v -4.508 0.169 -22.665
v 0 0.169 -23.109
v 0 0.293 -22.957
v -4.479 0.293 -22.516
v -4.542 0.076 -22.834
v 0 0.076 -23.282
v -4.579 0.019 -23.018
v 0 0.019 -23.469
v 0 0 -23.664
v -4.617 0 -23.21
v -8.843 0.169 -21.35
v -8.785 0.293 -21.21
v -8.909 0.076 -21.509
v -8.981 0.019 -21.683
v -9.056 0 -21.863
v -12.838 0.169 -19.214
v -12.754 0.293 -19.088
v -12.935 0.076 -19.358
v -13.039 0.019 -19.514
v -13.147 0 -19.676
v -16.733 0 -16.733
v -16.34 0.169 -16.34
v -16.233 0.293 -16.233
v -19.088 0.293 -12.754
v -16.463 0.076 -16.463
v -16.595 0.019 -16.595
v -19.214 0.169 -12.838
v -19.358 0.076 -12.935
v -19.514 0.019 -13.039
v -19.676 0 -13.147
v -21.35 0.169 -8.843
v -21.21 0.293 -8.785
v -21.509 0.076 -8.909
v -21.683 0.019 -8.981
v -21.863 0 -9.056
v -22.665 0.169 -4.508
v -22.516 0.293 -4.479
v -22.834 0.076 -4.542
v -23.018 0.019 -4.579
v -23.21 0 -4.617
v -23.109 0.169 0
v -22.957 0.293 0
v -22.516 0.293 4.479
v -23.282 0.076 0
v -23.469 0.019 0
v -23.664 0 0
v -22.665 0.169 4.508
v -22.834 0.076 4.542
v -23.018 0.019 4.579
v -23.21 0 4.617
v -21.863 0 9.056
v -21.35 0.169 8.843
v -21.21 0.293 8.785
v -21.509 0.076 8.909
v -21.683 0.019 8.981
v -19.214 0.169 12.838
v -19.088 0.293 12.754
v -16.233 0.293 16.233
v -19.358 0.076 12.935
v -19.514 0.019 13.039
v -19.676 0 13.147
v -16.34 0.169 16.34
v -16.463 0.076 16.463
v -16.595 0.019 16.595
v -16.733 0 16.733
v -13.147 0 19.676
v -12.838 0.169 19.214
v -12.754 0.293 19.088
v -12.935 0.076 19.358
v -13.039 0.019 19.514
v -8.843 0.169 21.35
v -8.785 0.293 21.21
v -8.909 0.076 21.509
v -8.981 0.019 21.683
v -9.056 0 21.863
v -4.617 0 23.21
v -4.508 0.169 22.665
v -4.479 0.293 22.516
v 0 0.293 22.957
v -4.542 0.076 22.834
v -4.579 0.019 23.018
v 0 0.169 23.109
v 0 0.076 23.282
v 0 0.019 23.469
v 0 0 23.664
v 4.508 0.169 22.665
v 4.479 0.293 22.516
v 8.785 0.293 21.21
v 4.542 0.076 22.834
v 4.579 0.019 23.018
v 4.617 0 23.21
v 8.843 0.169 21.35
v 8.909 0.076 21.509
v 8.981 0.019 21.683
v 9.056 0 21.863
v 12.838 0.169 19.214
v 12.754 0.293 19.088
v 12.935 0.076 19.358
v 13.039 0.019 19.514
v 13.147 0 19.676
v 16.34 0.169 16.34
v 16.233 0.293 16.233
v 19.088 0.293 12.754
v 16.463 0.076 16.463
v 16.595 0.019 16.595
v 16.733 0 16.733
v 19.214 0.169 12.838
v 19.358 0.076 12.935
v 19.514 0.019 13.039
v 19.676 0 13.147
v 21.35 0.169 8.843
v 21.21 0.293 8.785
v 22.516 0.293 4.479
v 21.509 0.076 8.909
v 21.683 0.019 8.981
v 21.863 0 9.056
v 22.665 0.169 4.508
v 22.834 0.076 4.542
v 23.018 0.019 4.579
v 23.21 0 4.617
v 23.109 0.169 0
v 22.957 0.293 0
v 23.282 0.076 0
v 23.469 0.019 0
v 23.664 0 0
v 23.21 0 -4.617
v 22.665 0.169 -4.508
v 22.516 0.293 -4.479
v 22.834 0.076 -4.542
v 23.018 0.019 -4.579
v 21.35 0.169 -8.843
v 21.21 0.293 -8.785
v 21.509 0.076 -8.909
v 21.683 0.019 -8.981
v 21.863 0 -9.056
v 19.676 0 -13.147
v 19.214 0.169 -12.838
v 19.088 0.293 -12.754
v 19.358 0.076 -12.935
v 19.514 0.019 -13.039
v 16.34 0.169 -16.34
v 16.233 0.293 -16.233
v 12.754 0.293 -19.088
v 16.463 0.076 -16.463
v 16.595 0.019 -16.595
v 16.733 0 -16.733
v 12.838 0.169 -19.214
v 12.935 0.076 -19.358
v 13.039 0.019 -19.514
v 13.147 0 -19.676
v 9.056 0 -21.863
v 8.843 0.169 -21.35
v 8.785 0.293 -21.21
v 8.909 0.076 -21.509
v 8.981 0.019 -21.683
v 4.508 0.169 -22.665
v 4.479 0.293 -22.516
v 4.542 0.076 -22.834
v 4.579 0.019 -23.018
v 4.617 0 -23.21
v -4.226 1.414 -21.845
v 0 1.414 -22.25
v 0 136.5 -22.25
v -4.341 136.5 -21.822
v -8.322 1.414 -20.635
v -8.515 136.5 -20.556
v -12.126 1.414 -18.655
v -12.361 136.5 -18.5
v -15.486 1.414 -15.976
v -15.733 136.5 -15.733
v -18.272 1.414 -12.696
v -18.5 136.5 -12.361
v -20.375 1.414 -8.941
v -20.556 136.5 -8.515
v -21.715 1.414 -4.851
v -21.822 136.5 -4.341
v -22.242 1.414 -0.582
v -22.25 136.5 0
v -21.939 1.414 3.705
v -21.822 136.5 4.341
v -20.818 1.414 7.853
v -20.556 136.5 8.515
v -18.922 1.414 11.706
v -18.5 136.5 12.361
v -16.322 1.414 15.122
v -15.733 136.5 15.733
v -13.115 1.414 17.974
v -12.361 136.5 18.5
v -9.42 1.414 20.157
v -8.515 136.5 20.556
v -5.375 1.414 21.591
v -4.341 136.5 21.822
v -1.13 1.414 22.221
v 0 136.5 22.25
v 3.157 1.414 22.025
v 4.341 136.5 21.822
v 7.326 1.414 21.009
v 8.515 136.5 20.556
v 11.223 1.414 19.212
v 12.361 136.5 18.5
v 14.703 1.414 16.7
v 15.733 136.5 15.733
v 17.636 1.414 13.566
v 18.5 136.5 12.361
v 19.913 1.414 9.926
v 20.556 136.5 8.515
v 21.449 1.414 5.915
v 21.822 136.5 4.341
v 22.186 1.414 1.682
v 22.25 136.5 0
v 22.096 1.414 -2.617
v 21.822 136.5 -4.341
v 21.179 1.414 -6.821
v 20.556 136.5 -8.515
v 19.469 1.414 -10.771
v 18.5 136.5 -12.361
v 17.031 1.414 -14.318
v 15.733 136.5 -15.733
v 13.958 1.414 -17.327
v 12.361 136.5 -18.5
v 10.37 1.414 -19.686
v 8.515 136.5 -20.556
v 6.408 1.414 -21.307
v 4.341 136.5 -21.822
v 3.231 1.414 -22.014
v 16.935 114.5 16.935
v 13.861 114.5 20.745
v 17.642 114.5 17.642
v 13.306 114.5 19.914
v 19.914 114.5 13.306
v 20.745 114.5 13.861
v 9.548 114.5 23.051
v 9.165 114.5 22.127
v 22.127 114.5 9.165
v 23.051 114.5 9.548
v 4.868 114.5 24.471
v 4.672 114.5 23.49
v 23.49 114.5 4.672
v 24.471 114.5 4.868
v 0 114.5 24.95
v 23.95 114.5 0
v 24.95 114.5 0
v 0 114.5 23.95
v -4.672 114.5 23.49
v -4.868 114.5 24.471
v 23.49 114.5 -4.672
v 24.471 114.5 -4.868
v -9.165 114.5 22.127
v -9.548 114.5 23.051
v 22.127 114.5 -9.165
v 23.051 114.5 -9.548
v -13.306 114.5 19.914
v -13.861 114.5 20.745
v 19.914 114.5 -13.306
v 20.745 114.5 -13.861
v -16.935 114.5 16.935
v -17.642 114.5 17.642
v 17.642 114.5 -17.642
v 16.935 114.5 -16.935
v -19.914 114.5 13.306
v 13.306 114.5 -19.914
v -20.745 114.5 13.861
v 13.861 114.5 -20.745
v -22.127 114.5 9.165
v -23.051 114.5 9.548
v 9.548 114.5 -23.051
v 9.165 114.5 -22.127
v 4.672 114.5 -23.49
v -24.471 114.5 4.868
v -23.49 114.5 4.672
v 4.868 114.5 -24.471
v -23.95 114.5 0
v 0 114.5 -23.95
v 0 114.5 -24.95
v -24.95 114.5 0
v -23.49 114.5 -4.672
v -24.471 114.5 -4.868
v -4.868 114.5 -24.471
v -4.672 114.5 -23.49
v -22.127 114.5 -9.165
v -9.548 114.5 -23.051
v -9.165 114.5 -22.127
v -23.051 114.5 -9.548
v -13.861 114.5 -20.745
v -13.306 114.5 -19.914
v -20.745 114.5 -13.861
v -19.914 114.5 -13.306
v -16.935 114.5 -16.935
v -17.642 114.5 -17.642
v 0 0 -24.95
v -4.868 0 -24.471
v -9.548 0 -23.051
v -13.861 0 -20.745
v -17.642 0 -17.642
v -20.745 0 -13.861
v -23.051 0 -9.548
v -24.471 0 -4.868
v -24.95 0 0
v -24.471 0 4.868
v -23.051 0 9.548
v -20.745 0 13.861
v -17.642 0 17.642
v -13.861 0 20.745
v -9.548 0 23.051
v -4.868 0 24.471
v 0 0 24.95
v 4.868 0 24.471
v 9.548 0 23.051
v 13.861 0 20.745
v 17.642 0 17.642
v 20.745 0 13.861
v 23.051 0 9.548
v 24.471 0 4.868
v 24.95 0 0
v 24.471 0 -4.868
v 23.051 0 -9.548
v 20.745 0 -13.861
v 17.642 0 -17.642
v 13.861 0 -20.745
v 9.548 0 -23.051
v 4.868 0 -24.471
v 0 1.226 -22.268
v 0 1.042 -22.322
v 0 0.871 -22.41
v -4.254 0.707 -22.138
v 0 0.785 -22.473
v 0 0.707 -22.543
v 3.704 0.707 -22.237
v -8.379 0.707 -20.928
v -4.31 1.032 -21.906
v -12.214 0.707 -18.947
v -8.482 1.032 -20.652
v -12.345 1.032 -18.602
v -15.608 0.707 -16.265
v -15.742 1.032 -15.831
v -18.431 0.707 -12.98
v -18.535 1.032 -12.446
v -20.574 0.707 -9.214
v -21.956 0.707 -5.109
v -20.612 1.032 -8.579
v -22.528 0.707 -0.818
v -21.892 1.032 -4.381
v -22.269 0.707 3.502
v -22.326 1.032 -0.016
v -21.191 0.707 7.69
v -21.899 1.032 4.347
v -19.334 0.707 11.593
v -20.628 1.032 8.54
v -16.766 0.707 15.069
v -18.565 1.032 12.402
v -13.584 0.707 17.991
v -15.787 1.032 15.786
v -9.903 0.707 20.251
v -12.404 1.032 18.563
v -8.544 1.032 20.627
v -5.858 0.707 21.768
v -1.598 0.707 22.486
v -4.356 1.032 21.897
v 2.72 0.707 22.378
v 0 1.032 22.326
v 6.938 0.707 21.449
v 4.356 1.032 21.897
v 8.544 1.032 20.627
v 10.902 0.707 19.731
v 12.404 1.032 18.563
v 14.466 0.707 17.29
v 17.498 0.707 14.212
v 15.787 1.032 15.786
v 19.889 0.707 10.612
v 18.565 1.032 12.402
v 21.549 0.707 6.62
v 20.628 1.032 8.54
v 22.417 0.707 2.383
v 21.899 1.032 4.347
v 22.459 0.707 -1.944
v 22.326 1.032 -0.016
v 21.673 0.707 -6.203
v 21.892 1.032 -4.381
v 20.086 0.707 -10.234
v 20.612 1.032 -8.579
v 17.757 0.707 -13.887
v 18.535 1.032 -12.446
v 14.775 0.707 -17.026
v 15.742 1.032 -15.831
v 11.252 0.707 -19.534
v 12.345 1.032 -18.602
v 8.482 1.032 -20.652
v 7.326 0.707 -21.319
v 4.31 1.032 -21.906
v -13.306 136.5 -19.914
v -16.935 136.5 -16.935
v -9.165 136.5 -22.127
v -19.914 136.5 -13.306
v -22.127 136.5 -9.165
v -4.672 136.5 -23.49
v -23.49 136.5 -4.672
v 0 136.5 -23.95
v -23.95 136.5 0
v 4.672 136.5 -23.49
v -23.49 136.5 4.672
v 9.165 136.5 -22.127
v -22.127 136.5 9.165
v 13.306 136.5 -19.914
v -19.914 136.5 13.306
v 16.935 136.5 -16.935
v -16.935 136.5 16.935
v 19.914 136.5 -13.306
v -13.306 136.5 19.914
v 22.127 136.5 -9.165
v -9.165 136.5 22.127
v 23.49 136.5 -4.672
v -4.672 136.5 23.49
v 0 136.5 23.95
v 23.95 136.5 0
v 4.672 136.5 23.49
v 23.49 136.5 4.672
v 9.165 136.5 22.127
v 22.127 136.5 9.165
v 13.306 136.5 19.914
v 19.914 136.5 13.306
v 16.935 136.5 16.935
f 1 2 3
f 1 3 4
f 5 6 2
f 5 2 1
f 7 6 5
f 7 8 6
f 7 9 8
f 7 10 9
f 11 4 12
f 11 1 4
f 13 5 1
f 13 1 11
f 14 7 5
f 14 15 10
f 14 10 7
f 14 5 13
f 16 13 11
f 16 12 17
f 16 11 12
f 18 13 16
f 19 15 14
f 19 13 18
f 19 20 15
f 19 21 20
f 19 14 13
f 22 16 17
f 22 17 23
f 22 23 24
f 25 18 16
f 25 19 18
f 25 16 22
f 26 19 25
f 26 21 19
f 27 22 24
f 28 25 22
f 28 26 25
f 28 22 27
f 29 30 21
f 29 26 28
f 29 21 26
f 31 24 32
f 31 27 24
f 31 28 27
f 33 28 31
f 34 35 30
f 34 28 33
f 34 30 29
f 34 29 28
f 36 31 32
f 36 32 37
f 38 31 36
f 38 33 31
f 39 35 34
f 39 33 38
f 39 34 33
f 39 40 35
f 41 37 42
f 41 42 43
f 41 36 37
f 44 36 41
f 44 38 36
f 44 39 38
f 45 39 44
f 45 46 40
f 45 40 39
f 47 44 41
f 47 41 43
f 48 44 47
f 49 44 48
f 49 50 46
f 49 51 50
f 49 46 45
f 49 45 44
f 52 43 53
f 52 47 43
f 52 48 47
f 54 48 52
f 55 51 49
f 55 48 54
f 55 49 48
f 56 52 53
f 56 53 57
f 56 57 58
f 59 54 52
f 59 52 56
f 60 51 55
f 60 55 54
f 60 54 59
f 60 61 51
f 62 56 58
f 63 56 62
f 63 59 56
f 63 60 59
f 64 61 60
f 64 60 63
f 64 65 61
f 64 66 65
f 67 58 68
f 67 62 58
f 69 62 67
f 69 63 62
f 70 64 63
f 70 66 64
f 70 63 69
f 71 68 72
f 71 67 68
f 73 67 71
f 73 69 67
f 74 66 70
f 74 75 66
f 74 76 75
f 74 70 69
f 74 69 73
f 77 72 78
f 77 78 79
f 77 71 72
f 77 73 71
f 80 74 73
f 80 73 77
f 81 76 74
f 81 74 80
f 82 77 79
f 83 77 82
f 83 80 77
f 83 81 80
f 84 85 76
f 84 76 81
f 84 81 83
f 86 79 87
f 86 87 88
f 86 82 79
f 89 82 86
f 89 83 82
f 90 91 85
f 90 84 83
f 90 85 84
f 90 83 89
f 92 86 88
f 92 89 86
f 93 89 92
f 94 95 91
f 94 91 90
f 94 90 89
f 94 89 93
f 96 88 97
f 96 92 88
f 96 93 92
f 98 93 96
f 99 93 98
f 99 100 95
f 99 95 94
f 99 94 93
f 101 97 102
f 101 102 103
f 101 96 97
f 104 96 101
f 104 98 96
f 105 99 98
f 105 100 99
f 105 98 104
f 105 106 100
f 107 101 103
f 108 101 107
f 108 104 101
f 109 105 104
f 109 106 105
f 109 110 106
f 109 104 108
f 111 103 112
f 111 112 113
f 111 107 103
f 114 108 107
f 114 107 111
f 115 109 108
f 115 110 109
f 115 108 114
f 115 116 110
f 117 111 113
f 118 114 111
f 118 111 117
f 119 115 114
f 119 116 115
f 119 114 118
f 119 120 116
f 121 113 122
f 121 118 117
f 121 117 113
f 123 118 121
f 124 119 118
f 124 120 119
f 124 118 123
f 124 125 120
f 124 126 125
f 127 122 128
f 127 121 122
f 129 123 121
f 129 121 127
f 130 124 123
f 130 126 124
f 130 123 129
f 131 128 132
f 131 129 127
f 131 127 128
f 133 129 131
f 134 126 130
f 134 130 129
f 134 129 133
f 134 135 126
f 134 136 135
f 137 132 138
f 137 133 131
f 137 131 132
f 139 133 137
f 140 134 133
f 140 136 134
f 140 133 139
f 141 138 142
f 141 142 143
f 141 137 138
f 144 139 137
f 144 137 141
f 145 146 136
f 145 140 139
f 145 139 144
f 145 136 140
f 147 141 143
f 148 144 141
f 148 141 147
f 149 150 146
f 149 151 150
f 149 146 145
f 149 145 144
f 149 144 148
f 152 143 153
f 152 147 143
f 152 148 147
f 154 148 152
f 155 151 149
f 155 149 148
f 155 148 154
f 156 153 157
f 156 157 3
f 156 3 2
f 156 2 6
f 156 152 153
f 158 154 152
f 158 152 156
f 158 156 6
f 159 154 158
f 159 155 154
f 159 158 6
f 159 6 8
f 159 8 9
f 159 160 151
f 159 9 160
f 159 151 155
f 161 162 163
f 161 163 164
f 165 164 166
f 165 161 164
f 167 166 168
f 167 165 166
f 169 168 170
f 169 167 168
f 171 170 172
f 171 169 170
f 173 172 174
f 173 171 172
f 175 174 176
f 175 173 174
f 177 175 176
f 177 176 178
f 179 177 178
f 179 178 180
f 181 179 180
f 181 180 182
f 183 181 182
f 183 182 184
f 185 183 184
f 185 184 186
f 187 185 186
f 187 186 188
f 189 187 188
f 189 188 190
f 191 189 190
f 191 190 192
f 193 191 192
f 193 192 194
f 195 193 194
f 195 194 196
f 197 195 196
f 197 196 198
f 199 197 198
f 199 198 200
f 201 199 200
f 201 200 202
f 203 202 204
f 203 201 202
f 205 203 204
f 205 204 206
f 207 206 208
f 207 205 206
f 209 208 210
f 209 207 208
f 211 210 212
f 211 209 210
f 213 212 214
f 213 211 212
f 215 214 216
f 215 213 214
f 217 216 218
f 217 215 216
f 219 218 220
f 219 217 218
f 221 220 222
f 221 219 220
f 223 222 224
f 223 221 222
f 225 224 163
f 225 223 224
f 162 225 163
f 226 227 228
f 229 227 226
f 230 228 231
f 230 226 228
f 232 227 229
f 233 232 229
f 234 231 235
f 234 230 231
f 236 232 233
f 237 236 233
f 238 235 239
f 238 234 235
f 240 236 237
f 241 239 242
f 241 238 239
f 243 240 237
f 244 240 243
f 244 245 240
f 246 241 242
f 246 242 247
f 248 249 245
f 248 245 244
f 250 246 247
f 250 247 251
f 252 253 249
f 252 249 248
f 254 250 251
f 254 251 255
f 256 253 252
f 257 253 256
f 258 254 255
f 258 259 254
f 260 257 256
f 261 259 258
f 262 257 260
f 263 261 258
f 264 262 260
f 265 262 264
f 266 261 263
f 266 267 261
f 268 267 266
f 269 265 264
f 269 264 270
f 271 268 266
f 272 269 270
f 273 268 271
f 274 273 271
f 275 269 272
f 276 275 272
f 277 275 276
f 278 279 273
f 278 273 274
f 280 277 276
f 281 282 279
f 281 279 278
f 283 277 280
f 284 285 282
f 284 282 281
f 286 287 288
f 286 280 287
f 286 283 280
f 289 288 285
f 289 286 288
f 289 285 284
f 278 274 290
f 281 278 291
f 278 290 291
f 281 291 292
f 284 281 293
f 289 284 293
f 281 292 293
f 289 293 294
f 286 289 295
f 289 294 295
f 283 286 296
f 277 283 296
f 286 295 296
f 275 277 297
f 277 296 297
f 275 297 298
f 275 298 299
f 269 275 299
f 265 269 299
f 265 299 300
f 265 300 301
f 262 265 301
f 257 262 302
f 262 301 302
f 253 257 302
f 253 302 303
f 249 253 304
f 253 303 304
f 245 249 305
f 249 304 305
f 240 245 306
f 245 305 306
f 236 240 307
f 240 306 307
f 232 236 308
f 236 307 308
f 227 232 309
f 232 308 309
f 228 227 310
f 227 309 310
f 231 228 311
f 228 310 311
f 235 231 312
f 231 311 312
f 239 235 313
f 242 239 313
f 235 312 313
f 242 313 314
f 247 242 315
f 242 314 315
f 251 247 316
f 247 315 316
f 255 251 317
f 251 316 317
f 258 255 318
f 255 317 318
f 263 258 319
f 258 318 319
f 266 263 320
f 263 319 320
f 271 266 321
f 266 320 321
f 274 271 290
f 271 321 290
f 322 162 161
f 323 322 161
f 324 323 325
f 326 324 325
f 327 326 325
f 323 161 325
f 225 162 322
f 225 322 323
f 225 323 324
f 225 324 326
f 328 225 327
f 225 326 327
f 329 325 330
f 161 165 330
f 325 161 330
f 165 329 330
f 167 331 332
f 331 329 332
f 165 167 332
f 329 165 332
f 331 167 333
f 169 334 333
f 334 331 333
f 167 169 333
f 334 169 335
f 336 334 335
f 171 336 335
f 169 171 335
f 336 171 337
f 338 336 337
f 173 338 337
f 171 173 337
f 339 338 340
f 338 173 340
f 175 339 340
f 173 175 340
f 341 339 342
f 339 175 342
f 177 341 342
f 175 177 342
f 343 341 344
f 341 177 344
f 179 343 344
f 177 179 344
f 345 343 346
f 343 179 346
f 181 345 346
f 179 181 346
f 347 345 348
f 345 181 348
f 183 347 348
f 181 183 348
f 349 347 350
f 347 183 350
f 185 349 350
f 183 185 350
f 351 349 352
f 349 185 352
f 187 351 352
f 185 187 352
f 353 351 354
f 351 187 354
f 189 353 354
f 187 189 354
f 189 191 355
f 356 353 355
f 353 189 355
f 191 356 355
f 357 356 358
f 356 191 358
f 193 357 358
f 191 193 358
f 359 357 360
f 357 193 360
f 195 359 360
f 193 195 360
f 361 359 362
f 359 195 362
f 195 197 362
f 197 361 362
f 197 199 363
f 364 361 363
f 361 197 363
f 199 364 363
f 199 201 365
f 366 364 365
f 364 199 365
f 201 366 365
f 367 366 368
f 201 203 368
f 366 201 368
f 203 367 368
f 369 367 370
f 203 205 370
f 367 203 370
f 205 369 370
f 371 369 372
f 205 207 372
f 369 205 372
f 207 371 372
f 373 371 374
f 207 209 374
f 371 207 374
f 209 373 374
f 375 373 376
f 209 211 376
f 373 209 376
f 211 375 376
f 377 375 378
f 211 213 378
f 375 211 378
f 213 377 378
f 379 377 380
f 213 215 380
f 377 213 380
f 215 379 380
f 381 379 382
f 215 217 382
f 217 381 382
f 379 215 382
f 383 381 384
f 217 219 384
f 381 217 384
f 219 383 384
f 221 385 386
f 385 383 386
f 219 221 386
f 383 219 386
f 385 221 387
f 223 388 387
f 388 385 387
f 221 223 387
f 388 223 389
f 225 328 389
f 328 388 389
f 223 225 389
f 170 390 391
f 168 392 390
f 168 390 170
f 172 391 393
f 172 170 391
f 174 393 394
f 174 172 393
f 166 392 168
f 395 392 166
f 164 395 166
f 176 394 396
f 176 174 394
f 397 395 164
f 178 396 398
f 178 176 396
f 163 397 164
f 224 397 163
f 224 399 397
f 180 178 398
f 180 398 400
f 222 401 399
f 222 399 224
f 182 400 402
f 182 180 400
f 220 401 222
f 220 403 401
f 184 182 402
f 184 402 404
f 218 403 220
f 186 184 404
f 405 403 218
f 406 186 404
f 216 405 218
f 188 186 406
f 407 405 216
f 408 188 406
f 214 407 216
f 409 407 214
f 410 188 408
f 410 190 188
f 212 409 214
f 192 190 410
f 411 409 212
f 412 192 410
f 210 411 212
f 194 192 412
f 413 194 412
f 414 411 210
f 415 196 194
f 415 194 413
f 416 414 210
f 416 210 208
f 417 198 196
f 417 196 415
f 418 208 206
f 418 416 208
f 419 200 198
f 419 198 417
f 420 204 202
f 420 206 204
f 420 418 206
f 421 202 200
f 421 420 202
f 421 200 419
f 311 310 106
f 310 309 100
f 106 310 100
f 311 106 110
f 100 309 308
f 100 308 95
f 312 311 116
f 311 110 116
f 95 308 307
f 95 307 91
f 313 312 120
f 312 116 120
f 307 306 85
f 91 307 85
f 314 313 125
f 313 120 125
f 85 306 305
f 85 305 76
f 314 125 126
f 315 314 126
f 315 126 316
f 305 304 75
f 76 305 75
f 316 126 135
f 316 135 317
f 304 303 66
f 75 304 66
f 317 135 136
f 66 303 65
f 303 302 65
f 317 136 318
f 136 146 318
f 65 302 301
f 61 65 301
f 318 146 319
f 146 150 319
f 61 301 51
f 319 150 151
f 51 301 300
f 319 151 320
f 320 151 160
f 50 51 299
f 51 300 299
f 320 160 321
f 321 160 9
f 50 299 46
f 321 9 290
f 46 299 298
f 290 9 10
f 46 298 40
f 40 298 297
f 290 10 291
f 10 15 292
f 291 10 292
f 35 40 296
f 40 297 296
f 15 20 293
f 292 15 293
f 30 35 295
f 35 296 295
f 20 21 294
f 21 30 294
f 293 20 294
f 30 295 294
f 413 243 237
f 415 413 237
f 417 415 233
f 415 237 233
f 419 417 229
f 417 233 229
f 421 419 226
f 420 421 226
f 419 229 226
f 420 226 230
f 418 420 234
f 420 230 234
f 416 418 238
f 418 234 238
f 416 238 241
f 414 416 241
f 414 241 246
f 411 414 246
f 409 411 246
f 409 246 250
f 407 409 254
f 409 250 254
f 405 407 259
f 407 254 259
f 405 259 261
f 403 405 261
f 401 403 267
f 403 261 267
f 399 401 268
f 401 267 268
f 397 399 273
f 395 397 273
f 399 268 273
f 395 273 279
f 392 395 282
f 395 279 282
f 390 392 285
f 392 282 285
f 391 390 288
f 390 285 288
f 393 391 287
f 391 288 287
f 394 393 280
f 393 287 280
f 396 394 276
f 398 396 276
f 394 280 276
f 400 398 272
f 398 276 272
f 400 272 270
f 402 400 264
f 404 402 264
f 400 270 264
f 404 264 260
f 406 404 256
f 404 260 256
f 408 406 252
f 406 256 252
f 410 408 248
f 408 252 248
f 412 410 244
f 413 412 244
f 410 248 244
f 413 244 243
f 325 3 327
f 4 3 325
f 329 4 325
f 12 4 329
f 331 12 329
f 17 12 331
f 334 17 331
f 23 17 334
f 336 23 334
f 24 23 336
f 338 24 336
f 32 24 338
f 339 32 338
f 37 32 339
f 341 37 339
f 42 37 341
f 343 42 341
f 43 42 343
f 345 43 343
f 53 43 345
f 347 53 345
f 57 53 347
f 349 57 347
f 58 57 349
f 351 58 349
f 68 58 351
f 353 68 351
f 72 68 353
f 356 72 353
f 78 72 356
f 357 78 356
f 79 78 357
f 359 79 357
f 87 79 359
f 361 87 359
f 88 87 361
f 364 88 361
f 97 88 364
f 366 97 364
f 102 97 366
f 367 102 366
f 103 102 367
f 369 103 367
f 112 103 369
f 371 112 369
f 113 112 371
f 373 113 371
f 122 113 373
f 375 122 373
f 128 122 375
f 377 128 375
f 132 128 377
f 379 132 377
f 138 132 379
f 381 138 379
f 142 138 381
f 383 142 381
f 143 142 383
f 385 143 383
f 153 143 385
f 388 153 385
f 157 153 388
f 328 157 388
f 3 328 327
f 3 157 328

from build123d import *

# Parameters (mm, degrees)
SKETCH_1_R      = 24.95
SKETCH_1_R_2    = 22.25
EXTRUDE_1_DEPTH = 114.5
SKETCH_2_R      = 23.95
SKETCH_2_R_2    = 22.25
EXTRUDE_2_DEPTH = 22
CHAMFER_1_SIZE  = 1
FILLET_1_R      = 1


with BuildPart() as part:
    # 草图1 → 凸台-拉伸1 (new body)
    with BuildSketch(Plane(origin=(0, 0, 0), x_dir=(1, 0, 0), z_dir=(0, 1, 0))):
        with Locations(Location((0, 0, 0), (0, 0, 90))):
            Circle(SKETCH_1_R)
        with Locations(Location((0, 0, 0), (0, 0, 90))):
            Circle(SKETCH_1_R_2, mode=Mode.SUBTRACT)
    extrude(amount=EXTRUDE_1_DEPTH)

    # 草图2 → 凸台-拉伸2 (add)
    with BuildSketch(Plane(origin=(0, 114.5, 0), x_dir=(1, 0, 0), z_dir=(0, 1, 0))):
        with Locations(Location((0, 0, 0), (0, 0, 270))):
            Circle(SKETCH_2_R)
        with Locations(Location((0, 0, 0), (0, 0, 90))):
            Circle(SKETCH_2_R_2, mode=Mode.SUBTRACT)
    extrude(amount=EXTRUDE_2_DEPTH)

    # 倒角1
    chamfer_1_edges = [part.edges().sort_by_distance(p)[0] for p in [
        (0, 0, 22.25),
    ]]
    chamfer(chamfer_1_edges, length=CHAMFER_1_SIZE)

    # 圆角1
    fillet_1_edges = [part.edges().sort_by_distance(p)[0] for p in [
        (0, 0, 23.25),
        (0, 1, 22.25),
    ]]
    fillet(fillet_1_edges, radius=FILLET_1_R)


solid = part.part
